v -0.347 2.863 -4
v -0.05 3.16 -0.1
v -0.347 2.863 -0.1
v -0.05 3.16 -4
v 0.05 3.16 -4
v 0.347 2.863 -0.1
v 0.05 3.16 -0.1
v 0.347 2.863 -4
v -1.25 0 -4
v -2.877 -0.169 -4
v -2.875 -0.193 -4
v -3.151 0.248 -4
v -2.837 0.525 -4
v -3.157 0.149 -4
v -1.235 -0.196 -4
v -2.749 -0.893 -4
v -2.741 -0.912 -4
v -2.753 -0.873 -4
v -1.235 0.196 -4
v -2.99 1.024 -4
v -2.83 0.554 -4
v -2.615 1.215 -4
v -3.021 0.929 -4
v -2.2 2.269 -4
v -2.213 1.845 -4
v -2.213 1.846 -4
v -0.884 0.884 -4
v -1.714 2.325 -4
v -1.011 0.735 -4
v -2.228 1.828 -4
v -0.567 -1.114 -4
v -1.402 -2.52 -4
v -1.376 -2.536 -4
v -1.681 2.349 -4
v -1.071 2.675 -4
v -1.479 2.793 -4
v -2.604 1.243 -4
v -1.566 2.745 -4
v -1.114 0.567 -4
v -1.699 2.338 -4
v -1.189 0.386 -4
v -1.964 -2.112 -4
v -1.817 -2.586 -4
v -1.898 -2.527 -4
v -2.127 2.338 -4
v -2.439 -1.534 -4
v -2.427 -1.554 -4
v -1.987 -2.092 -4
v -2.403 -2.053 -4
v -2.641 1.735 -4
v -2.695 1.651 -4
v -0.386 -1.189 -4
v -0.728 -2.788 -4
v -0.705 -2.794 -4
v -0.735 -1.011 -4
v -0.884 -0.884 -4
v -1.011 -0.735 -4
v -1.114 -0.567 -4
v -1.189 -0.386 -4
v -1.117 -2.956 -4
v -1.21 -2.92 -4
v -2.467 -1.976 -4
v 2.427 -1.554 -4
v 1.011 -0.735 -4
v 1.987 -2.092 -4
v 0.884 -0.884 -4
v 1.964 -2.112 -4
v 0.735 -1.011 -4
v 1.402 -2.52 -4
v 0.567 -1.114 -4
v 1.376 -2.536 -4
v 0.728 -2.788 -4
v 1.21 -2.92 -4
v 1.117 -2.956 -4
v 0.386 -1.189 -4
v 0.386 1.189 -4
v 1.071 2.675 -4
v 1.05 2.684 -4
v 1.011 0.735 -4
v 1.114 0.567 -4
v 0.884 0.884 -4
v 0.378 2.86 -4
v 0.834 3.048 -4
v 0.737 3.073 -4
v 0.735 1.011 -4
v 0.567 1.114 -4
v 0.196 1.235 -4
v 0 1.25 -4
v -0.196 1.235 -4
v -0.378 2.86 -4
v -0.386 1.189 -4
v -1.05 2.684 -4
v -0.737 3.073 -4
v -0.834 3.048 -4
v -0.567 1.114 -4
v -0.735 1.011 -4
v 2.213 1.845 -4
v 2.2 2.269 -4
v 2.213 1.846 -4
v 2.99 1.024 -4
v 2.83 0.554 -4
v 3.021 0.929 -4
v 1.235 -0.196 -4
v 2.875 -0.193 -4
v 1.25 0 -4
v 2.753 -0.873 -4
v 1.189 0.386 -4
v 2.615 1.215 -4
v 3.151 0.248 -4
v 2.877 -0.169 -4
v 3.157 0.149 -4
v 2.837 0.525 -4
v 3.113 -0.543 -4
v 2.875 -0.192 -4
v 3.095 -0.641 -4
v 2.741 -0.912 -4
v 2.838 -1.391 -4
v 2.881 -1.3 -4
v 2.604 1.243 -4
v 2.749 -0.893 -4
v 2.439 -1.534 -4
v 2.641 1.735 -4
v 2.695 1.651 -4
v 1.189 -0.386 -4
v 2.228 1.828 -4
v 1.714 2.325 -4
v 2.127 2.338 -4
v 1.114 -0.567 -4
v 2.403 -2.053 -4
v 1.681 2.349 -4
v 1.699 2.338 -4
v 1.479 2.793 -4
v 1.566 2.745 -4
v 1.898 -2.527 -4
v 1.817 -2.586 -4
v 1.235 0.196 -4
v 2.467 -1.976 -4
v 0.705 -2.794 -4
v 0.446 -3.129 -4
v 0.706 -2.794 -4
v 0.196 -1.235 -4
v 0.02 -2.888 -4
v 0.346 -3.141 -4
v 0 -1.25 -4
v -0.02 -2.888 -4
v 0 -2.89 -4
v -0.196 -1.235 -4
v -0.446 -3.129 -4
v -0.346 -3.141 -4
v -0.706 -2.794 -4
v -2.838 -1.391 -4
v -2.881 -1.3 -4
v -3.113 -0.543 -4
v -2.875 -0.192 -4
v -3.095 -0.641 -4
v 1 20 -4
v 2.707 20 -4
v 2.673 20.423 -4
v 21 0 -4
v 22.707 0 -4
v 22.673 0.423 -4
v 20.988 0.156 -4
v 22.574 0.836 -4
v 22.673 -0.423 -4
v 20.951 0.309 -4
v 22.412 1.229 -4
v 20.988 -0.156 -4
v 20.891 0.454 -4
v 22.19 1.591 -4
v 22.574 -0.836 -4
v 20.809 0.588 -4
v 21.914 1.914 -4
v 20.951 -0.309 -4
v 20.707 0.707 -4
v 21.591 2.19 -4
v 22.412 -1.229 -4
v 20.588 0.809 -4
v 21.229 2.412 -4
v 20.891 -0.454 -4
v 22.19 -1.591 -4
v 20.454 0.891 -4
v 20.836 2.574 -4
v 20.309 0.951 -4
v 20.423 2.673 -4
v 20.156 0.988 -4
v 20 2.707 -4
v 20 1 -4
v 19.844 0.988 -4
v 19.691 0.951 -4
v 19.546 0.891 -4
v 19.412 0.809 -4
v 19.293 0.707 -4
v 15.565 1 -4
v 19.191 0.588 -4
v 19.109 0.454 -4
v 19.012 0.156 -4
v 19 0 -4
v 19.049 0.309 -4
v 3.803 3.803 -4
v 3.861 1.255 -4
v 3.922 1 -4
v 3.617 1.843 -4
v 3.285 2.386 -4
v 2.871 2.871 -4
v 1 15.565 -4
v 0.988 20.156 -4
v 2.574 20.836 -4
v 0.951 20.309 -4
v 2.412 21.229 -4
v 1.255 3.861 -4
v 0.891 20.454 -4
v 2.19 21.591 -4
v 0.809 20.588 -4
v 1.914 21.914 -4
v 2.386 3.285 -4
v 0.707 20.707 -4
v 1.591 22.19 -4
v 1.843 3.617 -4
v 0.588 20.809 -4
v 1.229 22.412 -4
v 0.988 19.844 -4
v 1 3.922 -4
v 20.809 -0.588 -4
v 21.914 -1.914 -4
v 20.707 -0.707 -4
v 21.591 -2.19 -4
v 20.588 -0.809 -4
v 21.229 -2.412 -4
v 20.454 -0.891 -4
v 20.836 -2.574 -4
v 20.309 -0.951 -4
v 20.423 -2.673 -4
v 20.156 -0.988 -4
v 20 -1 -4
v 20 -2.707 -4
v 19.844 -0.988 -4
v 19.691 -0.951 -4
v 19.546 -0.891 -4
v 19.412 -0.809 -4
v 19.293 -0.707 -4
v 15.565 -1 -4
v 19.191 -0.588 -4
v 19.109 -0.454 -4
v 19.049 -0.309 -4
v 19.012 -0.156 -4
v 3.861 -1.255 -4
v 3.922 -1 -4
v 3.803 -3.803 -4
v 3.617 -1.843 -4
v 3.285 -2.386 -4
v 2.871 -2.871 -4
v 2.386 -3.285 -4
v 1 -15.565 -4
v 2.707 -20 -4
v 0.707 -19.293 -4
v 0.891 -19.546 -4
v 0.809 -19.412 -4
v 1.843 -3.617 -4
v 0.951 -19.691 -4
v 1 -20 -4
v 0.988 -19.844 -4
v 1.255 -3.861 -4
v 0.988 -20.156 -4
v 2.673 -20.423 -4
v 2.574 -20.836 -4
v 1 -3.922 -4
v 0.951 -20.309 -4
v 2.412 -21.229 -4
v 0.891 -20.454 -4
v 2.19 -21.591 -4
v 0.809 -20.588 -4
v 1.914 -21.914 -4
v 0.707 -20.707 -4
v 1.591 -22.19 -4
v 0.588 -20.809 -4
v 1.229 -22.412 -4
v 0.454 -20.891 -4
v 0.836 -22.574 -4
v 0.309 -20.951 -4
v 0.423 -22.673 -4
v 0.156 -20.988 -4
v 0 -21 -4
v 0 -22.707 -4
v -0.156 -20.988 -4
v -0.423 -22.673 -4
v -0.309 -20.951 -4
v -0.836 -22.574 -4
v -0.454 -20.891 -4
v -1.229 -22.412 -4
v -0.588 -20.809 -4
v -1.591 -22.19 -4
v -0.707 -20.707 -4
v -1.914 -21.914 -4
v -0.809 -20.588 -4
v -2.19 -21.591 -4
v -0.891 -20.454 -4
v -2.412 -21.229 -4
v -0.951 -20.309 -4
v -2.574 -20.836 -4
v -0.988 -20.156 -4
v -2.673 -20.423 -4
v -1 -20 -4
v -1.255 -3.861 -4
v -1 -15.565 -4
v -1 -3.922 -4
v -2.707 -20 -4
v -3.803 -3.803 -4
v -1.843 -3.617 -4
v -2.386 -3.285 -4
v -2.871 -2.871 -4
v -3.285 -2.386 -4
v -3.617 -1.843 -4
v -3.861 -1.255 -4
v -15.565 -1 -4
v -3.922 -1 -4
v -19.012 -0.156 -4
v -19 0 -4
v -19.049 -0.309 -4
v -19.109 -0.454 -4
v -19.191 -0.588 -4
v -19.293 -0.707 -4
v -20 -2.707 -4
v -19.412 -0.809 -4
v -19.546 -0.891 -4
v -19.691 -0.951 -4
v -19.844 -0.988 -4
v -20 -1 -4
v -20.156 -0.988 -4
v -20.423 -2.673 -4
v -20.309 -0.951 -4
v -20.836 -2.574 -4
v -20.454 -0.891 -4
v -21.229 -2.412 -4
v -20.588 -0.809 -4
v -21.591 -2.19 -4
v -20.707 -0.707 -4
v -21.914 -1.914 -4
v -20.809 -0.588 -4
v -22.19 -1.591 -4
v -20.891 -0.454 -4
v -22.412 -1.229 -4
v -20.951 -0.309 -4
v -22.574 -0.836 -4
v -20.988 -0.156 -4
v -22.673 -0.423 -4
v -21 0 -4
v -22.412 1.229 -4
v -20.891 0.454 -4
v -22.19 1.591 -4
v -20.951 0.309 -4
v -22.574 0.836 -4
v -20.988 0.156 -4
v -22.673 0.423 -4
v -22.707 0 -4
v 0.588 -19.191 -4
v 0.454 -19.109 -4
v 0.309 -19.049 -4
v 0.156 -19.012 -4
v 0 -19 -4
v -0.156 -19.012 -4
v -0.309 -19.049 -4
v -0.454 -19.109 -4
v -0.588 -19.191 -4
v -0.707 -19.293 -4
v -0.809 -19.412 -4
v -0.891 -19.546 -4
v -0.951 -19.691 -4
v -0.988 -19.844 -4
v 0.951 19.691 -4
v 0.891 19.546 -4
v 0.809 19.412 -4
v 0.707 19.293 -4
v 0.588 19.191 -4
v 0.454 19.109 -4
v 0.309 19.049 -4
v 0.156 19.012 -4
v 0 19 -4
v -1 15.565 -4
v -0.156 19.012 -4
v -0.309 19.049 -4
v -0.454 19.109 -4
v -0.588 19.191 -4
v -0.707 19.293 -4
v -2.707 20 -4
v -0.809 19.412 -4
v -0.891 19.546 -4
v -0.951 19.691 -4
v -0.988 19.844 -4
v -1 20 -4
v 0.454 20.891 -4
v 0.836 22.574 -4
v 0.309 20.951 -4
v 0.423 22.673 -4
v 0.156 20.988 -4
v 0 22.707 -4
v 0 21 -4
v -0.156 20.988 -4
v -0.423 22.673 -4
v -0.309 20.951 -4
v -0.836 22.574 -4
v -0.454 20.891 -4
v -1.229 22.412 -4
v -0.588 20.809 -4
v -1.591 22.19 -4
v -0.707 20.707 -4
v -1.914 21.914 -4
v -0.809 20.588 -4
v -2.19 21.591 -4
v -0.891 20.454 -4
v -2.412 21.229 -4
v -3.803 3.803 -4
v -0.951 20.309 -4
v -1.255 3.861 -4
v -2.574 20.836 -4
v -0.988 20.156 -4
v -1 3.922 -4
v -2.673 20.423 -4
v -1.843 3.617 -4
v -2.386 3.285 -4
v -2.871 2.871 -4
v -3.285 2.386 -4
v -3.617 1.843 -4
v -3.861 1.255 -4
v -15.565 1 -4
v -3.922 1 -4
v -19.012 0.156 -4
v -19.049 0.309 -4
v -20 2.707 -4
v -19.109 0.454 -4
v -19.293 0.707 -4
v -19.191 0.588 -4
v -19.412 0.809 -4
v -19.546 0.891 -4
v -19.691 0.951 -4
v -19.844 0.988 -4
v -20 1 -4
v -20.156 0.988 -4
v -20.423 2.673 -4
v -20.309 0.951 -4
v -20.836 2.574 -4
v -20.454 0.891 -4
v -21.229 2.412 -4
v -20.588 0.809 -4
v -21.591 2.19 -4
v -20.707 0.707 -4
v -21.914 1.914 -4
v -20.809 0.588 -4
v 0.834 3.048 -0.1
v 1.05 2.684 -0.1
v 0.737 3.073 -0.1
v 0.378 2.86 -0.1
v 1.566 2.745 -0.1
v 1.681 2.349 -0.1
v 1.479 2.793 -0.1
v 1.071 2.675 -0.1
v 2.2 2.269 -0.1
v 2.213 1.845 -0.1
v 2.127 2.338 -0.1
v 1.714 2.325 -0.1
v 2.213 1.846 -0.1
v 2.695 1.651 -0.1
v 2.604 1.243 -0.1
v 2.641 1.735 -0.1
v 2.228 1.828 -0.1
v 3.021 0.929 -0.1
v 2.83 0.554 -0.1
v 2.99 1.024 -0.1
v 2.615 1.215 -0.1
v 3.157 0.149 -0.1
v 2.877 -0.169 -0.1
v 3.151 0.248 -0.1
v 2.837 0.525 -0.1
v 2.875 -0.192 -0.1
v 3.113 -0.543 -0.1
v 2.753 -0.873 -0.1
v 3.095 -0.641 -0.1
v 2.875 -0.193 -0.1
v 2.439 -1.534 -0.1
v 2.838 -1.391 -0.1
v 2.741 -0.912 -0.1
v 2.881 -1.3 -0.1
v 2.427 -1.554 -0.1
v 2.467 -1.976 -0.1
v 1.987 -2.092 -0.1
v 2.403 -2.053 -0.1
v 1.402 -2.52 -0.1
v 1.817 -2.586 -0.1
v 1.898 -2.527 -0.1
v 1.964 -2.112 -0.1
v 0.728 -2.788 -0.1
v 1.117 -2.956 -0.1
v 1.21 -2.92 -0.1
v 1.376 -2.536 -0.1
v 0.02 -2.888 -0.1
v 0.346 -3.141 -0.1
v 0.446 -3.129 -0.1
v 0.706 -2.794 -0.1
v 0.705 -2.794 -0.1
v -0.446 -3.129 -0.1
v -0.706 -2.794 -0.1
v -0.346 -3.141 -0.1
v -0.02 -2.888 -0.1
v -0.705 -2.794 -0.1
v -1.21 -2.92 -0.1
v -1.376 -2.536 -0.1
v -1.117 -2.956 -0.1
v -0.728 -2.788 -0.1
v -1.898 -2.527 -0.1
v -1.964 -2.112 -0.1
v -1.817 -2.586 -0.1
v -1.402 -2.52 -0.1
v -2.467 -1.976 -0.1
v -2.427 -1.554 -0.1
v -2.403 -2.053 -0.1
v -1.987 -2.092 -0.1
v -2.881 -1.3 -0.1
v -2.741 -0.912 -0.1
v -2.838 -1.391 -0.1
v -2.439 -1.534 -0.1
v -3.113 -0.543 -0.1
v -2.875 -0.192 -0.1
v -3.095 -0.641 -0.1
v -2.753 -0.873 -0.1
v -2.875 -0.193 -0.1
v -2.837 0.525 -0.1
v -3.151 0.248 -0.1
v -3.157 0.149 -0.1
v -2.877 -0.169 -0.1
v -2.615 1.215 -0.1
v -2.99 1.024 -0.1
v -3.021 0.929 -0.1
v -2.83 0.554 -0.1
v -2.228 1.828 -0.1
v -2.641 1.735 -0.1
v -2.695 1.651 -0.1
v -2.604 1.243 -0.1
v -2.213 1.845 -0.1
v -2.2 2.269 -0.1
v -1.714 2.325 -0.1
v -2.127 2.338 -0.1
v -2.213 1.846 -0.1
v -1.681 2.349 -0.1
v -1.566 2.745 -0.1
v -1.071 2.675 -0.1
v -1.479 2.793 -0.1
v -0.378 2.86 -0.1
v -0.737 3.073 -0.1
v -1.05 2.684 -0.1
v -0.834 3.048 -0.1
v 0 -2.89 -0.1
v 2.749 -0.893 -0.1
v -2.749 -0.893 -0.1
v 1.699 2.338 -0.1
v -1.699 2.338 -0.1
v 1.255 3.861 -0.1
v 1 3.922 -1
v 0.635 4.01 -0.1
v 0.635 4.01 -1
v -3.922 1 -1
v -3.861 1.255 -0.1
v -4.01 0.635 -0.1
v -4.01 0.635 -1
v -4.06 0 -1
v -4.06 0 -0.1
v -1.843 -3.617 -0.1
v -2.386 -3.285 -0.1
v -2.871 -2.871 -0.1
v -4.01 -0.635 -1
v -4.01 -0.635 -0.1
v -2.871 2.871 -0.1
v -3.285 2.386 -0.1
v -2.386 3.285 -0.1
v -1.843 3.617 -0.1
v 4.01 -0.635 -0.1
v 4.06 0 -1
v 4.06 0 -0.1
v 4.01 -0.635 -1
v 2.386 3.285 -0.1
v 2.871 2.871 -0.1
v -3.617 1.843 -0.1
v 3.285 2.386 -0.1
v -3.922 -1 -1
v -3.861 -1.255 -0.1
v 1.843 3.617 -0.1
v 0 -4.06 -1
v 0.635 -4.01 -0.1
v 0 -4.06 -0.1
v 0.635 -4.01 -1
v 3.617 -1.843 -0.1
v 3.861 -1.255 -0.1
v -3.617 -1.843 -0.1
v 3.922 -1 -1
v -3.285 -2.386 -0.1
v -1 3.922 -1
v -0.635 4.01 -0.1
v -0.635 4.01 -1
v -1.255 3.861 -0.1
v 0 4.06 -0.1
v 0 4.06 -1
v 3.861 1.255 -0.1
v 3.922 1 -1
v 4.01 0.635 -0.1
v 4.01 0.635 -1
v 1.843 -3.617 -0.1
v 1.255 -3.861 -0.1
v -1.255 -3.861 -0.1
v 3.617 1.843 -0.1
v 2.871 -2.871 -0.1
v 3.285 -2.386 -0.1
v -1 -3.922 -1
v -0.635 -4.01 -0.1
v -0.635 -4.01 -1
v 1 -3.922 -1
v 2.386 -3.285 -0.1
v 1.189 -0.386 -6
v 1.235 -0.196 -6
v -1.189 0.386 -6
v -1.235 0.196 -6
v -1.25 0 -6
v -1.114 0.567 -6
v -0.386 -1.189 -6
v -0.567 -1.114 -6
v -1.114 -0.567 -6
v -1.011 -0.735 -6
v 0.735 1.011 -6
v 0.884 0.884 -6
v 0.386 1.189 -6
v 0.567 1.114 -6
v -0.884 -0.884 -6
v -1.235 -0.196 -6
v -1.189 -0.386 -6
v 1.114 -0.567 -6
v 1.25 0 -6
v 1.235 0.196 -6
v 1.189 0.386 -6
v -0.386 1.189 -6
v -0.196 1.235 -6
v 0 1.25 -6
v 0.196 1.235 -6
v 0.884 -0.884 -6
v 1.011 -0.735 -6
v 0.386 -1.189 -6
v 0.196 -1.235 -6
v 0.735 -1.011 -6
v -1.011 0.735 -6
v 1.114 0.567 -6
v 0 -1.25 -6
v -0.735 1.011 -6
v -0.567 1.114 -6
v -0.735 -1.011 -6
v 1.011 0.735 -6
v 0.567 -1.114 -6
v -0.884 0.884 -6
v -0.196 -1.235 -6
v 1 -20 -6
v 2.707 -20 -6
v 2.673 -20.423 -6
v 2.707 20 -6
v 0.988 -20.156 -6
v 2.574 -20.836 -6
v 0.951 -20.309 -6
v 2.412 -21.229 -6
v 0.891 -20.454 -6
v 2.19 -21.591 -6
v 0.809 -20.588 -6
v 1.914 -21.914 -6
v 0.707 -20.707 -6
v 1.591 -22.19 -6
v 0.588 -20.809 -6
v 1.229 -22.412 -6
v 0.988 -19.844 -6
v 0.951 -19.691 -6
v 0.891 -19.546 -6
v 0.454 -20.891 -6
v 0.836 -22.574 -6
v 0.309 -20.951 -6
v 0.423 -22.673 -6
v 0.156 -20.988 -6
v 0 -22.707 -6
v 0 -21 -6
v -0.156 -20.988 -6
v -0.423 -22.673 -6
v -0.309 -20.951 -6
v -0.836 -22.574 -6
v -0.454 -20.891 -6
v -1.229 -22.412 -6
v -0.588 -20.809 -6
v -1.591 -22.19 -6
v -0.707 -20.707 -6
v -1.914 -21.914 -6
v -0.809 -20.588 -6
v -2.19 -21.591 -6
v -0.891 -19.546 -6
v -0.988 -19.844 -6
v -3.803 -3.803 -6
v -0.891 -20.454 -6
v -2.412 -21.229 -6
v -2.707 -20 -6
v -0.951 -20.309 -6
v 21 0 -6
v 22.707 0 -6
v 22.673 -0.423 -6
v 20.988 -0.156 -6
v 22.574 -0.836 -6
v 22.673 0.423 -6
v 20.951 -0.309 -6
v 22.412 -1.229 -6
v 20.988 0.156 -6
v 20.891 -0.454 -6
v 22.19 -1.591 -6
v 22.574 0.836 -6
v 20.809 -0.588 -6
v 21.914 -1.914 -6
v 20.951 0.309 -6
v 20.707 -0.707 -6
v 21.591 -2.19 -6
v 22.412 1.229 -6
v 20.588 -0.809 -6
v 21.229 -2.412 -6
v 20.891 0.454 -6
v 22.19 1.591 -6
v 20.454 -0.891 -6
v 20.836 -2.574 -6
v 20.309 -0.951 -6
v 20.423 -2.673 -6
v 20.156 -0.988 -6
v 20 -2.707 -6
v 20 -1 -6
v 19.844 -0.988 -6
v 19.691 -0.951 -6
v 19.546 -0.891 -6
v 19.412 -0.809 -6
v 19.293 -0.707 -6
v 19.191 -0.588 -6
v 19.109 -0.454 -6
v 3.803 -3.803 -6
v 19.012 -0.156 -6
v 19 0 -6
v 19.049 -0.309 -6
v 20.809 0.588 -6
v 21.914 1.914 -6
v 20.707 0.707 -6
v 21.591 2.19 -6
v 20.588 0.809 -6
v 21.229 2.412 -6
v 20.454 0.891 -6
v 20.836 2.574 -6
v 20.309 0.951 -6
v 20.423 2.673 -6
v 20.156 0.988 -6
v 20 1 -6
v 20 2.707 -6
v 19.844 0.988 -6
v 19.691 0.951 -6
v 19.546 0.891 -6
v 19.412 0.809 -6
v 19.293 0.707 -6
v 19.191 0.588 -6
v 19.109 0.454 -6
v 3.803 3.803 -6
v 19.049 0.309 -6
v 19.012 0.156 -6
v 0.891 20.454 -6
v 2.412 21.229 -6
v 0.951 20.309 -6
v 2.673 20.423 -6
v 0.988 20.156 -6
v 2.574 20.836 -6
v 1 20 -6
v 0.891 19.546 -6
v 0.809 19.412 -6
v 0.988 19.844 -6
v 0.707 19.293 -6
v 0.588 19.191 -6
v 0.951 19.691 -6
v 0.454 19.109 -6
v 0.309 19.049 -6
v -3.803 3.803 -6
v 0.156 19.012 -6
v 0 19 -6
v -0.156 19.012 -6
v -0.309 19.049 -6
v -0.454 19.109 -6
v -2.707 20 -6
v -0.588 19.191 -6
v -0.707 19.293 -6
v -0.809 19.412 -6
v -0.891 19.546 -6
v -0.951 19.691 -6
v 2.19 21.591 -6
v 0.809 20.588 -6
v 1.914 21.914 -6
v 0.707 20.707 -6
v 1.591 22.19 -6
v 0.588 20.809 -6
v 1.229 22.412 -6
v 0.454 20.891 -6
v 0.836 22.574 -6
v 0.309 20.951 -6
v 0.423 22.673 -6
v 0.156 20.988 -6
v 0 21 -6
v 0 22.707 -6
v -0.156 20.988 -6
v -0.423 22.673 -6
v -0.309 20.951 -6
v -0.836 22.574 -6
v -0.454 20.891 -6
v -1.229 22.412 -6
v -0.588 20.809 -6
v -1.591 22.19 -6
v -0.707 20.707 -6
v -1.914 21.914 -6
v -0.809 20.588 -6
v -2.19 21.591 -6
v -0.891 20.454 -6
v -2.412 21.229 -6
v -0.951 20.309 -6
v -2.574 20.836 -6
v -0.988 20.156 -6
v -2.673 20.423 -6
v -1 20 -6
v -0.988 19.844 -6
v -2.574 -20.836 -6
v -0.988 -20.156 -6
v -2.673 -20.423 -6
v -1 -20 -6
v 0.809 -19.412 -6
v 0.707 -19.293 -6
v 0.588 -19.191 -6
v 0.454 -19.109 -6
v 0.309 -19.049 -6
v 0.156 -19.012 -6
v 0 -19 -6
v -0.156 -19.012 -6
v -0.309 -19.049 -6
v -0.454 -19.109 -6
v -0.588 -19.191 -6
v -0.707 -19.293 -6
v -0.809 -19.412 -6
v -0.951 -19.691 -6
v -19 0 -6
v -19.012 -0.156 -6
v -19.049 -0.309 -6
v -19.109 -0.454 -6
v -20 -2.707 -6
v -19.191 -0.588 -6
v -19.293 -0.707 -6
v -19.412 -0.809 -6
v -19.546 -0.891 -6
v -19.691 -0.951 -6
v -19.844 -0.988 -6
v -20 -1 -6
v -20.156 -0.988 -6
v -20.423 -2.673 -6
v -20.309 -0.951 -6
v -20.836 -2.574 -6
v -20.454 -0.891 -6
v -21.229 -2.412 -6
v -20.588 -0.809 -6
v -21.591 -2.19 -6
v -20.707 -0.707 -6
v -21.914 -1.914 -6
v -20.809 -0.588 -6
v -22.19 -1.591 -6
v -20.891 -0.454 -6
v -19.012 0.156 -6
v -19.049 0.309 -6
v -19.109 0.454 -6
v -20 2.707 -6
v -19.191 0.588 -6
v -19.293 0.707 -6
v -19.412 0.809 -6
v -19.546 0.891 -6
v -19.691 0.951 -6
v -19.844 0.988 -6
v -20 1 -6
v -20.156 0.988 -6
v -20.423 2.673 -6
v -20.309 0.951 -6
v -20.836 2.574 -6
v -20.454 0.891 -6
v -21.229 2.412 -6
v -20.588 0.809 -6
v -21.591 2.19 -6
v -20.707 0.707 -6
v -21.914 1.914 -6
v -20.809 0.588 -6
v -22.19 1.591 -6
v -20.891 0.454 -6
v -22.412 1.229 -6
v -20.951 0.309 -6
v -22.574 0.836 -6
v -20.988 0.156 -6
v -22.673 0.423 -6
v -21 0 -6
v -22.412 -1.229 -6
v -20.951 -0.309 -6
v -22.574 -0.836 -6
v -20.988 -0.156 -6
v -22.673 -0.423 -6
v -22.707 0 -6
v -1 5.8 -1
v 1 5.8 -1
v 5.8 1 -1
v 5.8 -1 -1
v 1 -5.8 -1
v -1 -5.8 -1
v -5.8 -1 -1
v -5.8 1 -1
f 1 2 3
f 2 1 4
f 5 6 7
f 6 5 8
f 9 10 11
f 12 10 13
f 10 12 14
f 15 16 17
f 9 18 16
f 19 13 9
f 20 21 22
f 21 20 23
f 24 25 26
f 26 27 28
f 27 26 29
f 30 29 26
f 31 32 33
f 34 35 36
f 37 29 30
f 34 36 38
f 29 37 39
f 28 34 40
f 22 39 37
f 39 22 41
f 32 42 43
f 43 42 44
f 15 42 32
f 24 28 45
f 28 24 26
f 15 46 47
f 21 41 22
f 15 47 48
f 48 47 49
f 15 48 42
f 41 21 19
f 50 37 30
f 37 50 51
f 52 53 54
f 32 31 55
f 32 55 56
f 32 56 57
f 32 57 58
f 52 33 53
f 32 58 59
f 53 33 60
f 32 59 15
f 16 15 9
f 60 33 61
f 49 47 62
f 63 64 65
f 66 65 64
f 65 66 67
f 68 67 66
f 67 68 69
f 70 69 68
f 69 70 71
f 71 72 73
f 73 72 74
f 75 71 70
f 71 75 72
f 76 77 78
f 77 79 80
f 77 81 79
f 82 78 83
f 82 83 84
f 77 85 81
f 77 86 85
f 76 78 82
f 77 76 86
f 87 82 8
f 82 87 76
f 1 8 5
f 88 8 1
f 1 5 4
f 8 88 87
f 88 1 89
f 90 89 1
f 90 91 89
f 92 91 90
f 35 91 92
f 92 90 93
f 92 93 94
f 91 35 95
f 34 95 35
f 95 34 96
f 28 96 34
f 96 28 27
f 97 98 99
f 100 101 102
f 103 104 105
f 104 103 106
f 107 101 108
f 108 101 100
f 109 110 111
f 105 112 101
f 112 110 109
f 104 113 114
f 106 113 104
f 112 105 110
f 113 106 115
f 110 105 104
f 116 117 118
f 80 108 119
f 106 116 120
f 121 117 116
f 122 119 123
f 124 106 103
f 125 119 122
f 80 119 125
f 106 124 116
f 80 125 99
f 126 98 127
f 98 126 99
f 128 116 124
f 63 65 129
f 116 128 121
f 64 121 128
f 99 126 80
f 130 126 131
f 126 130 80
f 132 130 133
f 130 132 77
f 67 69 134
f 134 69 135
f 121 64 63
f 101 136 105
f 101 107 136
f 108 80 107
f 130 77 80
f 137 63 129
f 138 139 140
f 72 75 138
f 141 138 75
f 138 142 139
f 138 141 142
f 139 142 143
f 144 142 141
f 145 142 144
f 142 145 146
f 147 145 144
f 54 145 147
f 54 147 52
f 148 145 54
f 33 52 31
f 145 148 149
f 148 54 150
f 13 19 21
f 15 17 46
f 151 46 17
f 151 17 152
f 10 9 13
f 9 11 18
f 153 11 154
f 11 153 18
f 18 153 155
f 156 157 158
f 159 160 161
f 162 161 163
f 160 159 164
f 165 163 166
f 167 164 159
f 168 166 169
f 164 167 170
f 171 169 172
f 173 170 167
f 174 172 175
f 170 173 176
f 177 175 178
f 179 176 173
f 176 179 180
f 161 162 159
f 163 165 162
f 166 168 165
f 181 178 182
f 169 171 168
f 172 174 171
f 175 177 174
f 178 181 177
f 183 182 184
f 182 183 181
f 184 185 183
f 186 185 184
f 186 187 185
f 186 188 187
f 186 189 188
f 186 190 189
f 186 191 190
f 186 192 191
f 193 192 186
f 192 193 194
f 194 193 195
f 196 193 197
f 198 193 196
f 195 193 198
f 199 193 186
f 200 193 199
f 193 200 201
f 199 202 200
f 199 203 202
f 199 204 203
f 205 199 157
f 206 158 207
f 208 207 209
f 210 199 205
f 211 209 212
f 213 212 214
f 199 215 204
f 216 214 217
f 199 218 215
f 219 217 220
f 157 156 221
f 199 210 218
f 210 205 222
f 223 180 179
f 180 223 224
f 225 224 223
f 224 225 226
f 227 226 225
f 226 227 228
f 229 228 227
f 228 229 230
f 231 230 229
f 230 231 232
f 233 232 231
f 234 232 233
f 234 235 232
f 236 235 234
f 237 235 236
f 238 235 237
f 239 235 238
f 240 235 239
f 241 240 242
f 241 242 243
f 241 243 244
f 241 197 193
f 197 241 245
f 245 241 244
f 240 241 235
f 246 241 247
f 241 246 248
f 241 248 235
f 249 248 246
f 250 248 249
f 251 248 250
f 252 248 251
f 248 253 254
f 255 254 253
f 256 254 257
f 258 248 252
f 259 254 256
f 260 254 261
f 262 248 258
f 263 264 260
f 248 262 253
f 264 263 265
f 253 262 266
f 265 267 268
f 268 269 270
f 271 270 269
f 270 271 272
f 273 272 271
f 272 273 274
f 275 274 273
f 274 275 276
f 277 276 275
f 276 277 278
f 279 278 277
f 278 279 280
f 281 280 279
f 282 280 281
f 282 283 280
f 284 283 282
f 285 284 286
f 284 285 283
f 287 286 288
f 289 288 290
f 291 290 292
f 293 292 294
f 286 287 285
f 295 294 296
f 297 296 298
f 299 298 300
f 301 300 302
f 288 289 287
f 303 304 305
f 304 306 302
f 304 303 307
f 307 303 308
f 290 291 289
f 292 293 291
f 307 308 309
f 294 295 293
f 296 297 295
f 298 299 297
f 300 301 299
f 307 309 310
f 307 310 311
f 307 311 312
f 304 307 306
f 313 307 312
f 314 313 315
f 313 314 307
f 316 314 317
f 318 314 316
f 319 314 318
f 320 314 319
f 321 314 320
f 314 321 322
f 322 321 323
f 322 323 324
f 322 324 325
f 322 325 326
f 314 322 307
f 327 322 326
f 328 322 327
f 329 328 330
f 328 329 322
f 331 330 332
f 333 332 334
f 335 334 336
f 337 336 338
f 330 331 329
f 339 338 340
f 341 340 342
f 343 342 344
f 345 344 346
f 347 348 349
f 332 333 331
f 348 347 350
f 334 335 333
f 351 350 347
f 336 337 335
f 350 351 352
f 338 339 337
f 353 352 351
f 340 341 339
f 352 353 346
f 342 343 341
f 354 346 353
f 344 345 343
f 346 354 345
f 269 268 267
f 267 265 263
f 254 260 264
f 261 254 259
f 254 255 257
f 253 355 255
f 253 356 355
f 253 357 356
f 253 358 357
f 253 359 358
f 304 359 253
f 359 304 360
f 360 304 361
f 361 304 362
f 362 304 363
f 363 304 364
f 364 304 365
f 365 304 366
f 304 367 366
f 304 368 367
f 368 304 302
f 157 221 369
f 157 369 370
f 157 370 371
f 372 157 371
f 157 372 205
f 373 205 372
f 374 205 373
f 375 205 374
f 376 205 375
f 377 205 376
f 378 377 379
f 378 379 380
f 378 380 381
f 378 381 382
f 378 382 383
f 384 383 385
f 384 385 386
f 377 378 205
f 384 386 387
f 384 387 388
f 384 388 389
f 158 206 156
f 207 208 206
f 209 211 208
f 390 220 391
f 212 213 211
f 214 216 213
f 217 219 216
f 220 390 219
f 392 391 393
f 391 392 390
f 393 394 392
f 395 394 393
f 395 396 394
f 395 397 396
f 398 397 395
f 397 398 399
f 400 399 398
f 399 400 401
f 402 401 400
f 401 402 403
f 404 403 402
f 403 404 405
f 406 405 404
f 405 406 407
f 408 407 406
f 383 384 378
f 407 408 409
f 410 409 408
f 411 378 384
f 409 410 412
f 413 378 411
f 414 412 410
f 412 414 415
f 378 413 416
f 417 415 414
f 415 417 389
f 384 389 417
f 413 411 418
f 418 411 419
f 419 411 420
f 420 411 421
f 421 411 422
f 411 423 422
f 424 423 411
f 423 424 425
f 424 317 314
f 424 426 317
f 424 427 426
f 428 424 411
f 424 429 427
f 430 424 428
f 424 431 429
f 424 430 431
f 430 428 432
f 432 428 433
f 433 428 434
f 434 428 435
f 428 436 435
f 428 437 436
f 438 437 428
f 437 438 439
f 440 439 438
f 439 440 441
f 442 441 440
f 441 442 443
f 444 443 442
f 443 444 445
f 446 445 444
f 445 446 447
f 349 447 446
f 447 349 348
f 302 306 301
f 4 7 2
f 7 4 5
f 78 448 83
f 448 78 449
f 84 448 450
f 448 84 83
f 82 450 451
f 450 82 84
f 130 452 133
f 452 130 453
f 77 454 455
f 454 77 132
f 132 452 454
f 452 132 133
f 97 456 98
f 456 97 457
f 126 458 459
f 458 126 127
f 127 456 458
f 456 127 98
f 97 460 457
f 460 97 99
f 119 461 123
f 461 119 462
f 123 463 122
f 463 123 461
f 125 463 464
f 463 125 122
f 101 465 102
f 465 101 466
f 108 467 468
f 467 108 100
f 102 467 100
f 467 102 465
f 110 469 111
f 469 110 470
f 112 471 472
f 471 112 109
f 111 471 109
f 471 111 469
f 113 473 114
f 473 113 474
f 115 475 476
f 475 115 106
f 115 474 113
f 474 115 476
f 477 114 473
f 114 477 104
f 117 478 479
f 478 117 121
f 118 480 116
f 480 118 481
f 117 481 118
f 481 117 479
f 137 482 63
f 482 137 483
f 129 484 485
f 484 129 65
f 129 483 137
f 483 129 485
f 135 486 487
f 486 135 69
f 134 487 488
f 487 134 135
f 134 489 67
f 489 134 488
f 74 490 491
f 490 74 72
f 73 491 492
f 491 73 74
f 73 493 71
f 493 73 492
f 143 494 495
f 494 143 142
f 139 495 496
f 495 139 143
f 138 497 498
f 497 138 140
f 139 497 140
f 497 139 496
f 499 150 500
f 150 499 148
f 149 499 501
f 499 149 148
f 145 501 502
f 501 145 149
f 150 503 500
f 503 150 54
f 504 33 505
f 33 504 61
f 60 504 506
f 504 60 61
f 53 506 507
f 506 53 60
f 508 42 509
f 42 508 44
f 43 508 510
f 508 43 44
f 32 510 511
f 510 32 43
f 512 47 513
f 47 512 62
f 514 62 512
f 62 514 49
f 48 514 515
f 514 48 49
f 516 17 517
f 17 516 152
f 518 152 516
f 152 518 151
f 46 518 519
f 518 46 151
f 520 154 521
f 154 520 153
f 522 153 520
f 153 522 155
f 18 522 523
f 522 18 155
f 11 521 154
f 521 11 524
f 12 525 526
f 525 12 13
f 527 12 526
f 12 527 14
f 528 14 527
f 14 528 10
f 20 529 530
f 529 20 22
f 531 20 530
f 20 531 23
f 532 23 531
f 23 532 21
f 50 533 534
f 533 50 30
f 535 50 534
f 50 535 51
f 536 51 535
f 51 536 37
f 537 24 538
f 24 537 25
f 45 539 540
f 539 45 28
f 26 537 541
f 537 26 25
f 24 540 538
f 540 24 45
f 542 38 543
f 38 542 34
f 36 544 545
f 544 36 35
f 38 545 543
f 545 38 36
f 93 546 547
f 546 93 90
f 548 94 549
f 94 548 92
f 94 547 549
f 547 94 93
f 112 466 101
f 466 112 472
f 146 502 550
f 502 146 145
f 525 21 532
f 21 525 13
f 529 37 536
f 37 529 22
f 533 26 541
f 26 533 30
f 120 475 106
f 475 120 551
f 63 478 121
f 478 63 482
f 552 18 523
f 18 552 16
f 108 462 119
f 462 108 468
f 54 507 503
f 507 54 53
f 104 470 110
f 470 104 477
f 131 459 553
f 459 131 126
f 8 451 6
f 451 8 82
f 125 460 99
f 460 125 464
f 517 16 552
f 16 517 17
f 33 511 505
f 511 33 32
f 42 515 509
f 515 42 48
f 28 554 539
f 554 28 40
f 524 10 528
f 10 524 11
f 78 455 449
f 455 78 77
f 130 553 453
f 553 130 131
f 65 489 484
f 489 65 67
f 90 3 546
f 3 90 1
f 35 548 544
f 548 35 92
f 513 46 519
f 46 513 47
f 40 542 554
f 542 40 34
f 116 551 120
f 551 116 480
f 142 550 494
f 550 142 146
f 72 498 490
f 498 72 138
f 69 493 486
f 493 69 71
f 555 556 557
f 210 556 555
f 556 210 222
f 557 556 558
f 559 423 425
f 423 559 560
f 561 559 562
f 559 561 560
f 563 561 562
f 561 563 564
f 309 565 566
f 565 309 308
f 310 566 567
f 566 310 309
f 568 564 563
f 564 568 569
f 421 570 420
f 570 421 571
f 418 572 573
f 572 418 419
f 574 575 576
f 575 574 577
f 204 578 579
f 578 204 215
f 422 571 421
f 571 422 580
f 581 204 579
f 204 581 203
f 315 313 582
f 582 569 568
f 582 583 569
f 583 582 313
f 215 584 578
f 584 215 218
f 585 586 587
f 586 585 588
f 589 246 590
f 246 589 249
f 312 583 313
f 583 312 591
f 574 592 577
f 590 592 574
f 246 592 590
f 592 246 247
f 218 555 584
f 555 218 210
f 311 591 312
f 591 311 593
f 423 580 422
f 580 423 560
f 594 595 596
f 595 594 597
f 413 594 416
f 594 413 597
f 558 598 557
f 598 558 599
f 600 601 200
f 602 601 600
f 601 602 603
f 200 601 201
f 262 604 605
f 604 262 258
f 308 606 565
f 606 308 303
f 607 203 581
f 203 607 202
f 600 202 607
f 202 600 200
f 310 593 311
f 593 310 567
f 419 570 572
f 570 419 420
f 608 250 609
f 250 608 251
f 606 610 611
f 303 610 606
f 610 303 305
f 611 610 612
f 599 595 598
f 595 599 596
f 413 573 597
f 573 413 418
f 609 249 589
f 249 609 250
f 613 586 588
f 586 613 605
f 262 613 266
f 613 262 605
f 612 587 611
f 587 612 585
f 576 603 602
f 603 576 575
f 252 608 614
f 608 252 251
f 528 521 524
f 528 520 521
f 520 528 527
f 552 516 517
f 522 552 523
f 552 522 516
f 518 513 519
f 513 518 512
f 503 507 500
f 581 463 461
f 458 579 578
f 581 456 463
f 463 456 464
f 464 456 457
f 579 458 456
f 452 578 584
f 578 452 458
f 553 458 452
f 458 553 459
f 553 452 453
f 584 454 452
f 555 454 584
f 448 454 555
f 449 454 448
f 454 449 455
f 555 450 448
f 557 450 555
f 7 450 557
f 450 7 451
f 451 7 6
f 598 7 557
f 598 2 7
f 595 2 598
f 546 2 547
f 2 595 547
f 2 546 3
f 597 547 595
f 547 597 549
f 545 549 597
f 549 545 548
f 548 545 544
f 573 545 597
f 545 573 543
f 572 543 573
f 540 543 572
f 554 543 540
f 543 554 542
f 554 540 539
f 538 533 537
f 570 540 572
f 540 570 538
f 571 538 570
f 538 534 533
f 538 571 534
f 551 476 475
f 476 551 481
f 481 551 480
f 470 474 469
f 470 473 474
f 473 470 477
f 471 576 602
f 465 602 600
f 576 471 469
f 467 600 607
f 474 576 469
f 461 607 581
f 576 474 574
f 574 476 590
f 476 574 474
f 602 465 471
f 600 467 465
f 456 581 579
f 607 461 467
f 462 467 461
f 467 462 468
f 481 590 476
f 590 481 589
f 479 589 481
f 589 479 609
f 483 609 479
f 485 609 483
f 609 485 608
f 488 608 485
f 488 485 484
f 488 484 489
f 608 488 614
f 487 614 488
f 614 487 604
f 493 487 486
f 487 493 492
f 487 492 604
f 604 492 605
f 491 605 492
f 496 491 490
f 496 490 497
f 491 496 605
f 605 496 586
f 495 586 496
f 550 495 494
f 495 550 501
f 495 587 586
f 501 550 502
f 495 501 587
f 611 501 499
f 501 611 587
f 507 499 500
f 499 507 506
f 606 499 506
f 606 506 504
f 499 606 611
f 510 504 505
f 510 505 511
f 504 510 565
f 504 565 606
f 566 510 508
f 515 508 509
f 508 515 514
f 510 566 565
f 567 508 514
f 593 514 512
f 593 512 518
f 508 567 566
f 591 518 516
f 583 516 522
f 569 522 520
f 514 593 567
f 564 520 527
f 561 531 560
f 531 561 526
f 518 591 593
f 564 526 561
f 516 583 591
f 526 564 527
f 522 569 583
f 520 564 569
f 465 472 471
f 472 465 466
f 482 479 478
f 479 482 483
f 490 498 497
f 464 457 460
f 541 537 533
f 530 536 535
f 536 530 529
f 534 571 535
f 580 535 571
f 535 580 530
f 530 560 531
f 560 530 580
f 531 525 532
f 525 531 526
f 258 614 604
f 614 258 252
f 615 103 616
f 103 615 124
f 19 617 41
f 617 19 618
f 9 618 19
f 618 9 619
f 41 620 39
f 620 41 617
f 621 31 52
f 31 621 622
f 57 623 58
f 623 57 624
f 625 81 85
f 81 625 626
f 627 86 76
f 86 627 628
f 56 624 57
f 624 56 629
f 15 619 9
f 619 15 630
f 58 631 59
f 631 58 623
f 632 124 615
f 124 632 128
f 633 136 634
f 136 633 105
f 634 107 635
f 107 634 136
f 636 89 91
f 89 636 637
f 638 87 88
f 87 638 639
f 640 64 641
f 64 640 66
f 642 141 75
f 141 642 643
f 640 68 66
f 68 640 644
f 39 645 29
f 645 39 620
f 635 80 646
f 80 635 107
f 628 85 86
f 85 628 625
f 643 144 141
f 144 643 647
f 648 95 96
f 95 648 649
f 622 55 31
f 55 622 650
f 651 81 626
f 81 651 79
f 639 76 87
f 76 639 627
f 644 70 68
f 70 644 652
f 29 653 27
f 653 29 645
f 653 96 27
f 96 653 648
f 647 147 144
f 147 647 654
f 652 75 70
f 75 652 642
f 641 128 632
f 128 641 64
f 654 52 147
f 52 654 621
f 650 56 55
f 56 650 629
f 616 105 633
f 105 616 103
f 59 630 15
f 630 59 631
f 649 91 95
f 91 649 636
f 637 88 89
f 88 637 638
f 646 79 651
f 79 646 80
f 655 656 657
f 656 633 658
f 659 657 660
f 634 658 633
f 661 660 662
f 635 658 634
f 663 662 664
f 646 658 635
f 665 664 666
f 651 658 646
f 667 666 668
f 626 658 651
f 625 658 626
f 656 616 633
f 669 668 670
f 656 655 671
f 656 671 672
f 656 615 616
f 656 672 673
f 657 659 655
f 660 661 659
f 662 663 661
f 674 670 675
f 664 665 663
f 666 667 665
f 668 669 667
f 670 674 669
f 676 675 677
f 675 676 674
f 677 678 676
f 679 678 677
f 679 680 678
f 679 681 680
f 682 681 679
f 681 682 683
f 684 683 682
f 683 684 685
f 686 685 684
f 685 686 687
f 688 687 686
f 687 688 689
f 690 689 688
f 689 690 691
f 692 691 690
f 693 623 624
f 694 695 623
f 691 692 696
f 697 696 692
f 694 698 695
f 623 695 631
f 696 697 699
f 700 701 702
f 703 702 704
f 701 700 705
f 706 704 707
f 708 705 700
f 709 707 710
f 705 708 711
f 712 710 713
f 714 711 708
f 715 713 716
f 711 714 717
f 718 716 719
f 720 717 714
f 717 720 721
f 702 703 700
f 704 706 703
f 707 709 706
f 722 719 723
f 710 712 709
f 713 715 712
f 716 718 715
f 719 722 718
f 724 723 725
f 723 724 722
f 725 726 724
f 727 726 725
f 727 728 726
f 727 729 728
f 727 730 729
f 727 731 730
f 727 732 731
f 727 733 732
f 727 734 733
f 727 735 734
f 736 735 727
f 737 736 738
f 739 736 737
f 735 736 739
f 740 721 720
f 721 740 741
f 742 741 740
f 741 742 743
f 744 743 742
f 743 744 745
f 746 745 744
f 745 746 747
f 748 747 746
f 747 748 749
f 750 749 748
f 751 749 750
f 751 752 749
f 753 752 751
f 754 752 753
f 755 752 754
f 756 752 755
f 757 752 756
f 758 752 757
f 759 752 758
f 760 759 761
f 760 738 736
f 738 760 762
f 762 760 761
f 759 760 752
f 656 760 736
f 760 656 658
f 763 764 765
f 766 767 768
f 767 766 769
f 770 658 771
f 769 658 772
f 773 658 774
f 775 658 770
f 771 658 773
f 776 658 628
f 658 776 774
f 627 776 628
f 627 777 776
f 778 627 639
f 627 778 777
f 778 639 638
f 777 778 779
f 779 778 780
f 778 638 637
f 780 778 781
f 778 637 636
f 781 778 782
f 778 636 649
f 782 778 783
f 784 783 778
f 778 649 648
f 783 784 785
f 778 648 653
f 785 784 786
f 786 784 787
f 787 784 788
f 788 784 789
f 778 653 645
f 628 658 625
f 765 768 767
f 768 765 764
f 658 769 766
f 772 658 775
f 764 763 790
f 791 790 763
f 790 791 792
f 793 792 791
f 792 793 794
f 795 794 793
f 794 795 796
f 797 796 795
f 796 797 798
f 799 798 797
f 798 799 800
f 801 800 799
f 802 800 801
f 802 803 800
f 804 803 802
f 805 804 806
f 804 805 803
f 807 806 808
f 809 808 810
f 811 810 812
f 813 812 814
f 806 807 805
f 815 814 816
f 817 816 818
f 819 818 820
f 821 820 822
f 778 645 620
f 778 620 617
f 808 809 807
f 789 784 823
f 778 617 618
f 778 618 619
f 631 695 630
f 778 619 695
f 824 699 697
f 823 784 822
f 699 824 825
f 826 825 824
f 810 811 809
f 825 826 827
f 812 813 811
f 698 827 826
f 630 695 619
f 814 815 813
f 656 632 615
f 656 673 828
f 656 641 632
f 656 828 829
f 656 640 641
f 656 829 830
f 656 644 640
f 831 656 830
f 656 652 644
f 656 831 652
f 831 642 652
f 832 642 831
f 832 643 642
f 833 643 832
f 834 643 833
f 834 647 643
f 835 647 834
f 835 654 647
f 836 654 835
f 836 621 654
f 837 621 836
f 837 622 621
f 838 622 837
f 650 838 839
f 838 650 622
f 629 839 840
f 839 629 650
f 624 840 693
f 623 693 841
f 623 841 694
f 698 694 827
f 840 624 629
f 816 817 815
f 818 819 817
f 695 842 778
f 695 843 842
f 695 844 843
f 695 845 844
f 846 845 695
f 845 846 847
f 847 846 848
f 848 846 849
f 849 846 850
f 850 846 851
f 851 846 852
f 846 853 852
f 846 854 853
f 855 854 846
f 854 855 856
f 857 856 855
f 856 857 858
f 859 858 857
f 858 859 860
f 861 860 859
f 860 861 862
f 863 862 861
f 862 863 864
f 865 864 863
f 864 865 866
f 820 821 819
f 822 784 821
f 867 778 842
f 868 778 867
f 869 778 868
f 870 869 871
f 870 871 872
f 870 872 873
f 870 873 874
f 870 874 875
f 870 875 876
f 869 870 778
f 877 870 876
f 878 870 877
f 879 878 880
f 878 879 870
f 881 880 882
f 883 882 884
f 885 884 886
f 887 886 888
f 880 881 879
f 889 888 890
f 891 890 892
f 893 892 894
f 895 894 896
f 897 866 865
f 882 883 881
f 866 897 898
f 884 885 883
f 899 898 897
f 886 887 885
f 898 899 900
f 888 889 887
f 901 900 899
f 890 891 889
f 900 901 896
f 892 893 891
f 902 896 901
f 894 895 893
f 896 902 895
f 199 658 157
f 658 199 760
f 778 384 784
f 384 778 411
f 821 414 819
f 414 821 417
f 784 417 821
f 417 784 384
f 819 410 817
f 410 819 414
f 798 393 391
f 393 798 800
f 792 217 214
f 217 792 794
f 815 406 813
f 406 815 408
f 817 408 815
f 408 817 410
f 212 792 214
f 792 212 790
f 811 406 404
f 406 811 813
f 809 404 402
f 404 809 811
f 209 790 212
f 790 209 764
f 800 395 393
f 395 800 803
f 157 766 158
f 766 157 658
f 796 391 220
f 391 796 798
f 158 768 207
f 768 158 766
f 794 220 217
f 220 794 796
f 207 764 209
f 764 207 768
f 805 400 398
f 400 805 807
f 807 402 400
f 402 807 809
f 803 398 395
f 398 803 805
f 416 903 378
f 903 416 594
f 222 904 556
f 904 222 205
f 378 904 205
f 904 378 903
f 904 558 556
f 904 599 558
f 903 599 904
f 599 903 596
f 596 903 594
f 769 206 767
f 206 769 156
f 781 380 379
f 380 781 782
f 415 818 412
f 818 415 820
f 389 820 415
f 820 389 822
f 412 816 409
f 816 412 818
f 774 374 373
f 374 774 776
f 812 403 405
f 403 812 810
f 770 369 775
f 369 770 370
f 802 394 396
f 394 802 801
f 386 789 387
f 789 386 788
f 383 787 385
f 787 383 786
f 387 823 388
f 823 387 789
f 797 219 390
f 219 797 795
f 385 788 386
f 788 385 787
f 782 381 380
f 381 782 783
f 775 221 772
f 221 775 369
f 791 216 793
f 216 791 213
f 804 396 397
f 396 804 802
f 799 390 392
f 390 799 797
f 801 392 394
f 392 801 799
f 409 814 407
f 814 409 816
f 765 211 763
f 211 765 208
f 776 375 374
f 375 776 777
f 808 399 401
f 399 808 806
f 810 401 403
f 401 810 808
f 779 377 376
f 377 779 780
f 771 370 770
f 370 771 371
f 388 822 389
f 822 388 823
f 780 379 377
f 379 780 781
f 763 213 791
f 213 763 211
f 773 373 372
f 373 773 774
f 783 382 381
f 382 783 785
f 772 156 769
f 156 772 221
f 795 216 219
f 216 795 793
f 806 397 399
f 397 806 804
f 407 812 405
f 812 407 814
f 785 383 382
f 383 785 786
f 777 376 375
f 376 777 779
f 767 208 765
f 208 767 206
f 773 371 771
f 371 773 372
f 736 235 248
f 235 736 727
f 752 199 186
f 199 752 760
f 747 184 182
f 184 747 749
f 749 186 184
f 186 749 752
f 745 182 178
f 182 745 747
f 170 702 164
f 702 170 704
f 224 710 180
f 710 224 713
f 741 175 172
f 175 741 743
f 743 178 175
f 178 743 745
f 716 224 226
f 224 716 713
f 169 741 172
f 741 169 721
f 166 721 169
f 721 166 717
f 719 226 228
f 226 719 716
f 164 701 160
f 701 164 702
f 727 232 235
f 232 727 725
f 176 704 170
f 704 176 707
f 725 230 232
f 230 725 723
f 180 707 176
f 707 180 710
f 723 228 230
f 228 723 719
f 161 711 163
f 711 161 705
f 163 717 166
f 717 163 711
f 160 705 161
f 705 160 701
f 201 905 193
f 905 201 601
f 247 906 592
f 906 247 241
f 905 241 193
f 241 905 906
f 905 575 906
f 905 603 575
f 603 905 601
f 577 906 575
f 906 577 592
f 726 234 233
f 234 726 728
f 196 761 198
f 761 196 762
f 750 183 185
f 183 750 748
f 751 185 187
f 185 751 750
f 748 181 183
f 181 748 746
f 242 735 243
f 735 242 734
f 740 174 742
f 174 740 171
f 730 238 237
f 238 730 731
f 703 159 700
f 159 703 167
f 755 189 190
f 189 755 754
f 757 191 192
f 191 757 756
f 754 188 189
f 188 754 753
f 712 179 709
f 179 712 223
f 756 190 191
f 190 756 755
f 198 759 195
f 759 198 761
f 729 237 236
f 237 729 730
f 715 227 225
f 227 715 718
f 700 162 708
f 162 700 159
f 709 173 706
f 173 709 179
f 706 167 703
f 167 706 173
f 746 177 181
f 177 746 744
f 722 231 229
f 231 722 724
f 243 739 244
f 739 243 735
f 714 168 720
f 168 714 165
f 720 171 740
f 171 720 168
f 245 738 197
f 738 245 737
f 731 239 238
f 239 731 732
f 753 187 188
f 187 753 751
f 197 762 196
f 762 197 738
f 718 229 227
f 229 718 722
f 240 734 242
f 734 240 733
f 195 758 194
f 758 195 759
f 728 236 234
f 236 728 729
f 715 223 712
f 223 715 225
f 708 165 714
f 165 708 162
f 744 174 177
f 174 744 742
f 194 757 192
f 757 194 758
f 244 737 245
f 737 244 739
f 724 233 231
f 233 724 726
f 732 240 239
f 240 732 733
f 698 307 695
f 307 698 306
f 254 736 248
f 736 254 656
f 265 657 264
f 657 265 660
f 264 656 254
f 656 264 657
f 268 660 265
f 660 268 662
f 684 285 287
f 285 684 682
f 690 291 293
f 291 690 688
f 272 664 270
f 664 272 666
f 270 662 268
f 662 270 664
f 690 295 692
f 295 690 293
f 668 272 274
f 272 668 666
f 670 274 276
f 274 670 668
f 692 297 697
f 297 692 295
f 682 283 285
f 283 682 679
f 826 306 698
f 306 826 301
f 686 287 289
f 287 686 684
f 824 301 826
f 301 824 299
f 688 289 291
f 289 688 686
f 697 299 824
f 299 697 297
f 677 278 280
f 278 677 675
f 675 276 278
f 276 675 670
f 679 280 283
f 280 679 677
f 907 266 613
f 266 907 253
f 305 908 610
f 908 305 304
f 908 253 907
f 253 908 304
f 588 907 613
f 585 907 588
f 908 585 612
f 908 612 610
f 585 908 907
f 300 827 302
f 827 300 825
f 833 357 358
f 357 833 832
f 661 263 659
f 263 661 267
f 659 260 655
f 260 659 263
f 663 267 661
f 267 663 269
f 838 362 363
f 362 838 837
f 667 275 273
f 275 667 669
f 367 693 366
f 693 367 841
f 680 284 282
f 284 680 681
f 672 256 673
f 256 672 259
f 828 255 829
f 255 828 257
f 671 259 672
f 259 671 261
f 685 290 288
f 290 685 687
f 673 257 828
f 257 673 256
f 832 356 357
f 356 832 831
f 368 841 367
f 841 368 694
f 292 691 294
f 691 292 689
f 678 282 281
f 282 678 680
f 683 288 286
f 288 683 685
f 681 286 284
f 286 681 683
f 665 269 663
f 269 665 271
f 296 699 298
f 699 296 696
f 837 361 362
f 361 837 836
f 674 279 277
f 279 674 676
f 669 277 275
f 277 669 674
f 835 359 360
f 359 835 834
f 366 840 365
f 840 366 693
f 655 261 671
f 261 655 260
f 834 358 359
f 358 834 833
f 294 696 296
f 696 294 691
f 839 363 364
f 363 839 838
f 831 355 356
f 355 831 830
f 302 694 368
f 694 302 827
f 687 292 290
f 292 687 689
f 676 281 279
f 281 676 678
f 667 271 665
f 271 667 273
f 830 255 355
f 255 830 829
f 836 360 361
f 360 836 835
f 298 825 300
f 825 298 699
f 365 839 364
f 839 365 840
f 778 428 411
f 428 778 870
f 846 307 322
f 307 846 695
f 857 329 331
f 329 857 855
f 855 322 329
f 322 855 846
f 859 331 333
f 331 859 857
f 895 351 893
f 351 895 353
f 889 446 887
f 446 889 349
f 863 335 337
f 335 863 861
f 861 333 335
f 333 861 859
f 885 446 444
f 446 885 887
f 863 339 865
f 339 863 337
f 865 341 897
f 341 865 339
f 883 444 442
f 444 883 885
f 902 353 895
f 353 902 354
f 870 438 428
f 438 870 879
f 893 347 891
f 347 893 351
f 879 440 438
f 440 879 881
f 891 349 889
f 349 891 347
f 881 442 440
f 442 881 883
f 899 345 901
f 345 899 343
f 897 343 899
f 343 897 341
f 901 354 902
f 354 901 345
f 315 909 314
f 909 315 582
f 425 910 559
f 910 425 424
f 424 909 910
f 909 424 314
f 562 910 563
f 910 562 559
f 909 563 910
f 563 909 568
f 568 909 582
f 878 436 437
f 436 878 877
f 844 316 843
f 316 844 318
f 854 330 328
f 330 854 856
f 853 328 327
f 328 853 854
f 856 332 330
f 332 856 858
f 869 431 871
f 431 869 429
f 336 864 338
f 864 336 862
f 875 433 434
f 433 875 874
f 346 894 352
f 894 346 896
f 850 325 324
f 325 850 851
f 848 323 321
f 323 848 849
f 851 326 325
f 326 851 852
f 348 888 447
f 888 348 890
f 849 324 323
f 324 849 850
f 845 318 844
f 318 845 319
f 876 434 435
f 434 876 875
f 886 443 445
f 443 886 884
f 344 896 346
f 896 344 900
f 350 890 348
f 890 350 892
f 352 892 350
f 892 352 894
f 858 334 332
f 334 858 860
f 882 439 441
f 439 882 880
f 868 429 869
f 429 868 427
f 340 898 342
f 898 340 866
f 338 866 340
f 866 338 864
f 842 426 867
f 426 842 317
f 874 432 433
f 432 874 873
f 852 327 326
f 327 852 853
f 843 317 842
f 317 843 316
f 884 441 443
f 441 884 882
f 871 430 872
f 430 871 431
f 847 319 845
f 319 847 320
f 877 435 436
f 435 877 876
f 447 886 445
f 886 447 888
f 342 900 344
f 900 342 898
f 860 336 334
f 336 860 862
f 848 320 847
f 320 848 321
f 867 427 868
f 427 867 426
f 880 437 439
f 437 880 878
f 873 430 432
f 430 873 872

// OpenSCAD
/**
 *  Parametric servo arm generator for OpenScad
 *  Générateur de palonnier de servo pour OpenScad
 *
 *  Copyright (c) 2012 Charles Rincheval.  All rights reserved.
 *
 *  This library is free software; you can redistribute it and/or
 *  modify it under the terms of the GNU Lesser General Public
 *  License as published by the Free Software Foundation; either
 *  version 2.1 of the License, or (at your option) any later version.
 *
 *  This library is distributed in the hope that it will be useful,
 *  but WITHOUT ANY WARRANTY; without even the implied warranty of
 *  MERCHANTABILITY or FITNESS FOR A PARTICULAR PURPOSE.  See the GNU
 *  Lesser General Public License for more details.
 *
 *  You should have received a copy of the GNU Lesser General Public
 *  License along with this library; if not, write to the Free Software
 *  Foundation, Inc., 51 Franklin St, Fifth Floor, Boston, MA  02110-1301  USA
 *
 *  Last update :
 *  https://github.com/hugokernel/OpenSCAD_ServoArms
 *
 *  http://www.digitalspirit.org/
 */

$fn = 40;

/**
 *  Clear between arm head and servo head
 *  With PLA material, use clear : 0.3, for ABS, use 0.2
 */
SERVO_HEAD_CLEAR = 0.2;

/**
 *  Head / Tooth parameters
 *  Futaba 3F Standard Spline
 *  http://www.servocity.com/html/futaba_servo_splines.html
 *
 *  First array (head related) :
 *  0. Head external diameter
 *  1. Head heigth
 *  2. Head thickness
 *  3. Head screw diameter
 *
 *  Second array (tooth related) :
 *  0. Tooth count
 *  1. Tooth height
 *  2. Tooth length
 *  3. Tooth width
 */
FUTABA_3F_SPLINE = [
    [5.92, 4, 1.1, 2.5],
    [25, 0.3, 0.7, 0.1]
];


module servo_futaba_3f(length, count) {
    servo_arm(FUTABA_3F_SPLINE, [length, count]);
}

/**
 *  If you want to support a new servo, juste add a new spline definition array
 *  and a module named like servo_XXX_YYY where XXX is servo brand and YYY is the
 *  connection type (3f) or the servo type (s3003)
 */

module servo_standard(length, count) {
    servo_futaba_3f(length, count);
}

/**
 *  Tooth
 *
 *    |<-w->|
 *    |_____|___
 *    /     \  ^h
 *  _/       \_v
 *   |<--l-->|
 *
 *  - tooth length (l)
 *  - tooth width (w)
 *  - tooth height (h)
 *  - height
 *
 */
module servo_head_tooth(length, width, height, head_height) {
    linear_extrude(height = head_height) {
        polygon([[-length / 2, 0], [-width / 2, height], [width / 2, height], [length / 2,0]]);
    }
}

/**
 *  Servo head
 */
module servo_head(params, clear = SERVO_HEAD_CLEAR) {

    head = params[0];
    tooth = params[1];

    head_diameter = head[0];
    head_heigth = head[1];

    tooth_count = tooth[0];
    tooth_height = tooth[1];
    tooth_length = tooth[2];
    tooth_width = tooth[3];

    % cylinder(r = head_diameter / 2, h = head_heigth + 1);

    cylinder(r = head_diameter / 2 - tooth_height + 0.03 + clear, h = head_heigth);

    for (i = [0 : tooth_count]) {
        rotate([0, 0, i * (360 / tooth_count)]) {
            translate([0, head_diameter / 2 - tooth_height + clear, 0]) {
                servo_head_tooth(tooth_length, tooth_width, tooth_height, head_heigth);
            }
        }
    }
}

/**
 *  Servo hold
 *  - Head / Tooth parameters
 *  - Arms params (length and count)
 */
module servo_arm(params, arms) {

    head = params[0];
    tooth = params[1];

    head_diameter = head[0];
    head_heigth = head[1];
    head_thickness = head[2];
    head_screw_diameter = head[3];

    tooth_length = tooth[2];
    tooth_width = tooth[3];

    arm_length = arms[0];
    arm_count = arms[1];

    /**
     *  Servo arm
     *  - length is from center to last hole
     */
    module arm(tooth_length, tooth_width, head_height, head_heigth, hole_count = 1) {

        arm_screw_diameter = 2;

        difference() {
            union() {
                cylinder(r = tooth_width / 2, h = head_heigth);

                linear_extrude(height = head_heigth) {
                    polygon([
                        [-tooth_width / 2, 0], [-tooth_width / 3, tooth_length],
                        [tooth_width / 3, tooth_length], [tooth_width / 2, 0]
                    ]);
                }

                translate([0, tooth_length, 0]) {
                    cylinder(r = tooth_width / 3, h = head_heigth);
                }

                if (tooth_length >= 12) {
                    translate([-head_heigth / 2 + 2, 3.8, -4]) {
                        rotate([90, 0, 0]) {
                            rotate([0, -90, 0]) {
                                linear_extrude(height = head_heigth) {
                                    polygon([
                                        [-tooth_length / 1.7, 4], [0, 4], [0, - head_height + 5],
                                        [-2, - head_height + 5]
                                    ]);
                                }
                            }
                        }
                    }
                }
            }

            // Hole
            for (i = [0 : hole_count - 1]) {
                //translate([0, length - (length / hole_count * i), -1]) {
                translate([0, tooth_length - (4 * i), -1]) {
                    cylinder(r = arm_screw_diameter / 2, h = 10);
                }
            }

            cylinder(r = head_screw_diameter / 2, h = 10);
        }
    }

    difference() {
        translate([0, 0, 0.1]) {
            cylinder(r = head_diameter / 2 + head_thickness, h = head_heigth + 1);
        }

        cylinder(r = head_screw_diameter / 2, h = 10);

        servo_head(params);
    }

    arm_thickness = head_thickness;

    // Arm
    translate([0, 0, head_heigth]) {
        for (i = [0 : arm_count - 1]) {
            rotate([0, 0, i * (360 / arm_count)]) {
                arm(arm_length, head_diameter + arm_thickness * 2, head_heigth, 2);
            }
        }
    }
}

module demo() {
    rotate([0, 180, 0])
        servo_standard(20, 4);
}

demo();
